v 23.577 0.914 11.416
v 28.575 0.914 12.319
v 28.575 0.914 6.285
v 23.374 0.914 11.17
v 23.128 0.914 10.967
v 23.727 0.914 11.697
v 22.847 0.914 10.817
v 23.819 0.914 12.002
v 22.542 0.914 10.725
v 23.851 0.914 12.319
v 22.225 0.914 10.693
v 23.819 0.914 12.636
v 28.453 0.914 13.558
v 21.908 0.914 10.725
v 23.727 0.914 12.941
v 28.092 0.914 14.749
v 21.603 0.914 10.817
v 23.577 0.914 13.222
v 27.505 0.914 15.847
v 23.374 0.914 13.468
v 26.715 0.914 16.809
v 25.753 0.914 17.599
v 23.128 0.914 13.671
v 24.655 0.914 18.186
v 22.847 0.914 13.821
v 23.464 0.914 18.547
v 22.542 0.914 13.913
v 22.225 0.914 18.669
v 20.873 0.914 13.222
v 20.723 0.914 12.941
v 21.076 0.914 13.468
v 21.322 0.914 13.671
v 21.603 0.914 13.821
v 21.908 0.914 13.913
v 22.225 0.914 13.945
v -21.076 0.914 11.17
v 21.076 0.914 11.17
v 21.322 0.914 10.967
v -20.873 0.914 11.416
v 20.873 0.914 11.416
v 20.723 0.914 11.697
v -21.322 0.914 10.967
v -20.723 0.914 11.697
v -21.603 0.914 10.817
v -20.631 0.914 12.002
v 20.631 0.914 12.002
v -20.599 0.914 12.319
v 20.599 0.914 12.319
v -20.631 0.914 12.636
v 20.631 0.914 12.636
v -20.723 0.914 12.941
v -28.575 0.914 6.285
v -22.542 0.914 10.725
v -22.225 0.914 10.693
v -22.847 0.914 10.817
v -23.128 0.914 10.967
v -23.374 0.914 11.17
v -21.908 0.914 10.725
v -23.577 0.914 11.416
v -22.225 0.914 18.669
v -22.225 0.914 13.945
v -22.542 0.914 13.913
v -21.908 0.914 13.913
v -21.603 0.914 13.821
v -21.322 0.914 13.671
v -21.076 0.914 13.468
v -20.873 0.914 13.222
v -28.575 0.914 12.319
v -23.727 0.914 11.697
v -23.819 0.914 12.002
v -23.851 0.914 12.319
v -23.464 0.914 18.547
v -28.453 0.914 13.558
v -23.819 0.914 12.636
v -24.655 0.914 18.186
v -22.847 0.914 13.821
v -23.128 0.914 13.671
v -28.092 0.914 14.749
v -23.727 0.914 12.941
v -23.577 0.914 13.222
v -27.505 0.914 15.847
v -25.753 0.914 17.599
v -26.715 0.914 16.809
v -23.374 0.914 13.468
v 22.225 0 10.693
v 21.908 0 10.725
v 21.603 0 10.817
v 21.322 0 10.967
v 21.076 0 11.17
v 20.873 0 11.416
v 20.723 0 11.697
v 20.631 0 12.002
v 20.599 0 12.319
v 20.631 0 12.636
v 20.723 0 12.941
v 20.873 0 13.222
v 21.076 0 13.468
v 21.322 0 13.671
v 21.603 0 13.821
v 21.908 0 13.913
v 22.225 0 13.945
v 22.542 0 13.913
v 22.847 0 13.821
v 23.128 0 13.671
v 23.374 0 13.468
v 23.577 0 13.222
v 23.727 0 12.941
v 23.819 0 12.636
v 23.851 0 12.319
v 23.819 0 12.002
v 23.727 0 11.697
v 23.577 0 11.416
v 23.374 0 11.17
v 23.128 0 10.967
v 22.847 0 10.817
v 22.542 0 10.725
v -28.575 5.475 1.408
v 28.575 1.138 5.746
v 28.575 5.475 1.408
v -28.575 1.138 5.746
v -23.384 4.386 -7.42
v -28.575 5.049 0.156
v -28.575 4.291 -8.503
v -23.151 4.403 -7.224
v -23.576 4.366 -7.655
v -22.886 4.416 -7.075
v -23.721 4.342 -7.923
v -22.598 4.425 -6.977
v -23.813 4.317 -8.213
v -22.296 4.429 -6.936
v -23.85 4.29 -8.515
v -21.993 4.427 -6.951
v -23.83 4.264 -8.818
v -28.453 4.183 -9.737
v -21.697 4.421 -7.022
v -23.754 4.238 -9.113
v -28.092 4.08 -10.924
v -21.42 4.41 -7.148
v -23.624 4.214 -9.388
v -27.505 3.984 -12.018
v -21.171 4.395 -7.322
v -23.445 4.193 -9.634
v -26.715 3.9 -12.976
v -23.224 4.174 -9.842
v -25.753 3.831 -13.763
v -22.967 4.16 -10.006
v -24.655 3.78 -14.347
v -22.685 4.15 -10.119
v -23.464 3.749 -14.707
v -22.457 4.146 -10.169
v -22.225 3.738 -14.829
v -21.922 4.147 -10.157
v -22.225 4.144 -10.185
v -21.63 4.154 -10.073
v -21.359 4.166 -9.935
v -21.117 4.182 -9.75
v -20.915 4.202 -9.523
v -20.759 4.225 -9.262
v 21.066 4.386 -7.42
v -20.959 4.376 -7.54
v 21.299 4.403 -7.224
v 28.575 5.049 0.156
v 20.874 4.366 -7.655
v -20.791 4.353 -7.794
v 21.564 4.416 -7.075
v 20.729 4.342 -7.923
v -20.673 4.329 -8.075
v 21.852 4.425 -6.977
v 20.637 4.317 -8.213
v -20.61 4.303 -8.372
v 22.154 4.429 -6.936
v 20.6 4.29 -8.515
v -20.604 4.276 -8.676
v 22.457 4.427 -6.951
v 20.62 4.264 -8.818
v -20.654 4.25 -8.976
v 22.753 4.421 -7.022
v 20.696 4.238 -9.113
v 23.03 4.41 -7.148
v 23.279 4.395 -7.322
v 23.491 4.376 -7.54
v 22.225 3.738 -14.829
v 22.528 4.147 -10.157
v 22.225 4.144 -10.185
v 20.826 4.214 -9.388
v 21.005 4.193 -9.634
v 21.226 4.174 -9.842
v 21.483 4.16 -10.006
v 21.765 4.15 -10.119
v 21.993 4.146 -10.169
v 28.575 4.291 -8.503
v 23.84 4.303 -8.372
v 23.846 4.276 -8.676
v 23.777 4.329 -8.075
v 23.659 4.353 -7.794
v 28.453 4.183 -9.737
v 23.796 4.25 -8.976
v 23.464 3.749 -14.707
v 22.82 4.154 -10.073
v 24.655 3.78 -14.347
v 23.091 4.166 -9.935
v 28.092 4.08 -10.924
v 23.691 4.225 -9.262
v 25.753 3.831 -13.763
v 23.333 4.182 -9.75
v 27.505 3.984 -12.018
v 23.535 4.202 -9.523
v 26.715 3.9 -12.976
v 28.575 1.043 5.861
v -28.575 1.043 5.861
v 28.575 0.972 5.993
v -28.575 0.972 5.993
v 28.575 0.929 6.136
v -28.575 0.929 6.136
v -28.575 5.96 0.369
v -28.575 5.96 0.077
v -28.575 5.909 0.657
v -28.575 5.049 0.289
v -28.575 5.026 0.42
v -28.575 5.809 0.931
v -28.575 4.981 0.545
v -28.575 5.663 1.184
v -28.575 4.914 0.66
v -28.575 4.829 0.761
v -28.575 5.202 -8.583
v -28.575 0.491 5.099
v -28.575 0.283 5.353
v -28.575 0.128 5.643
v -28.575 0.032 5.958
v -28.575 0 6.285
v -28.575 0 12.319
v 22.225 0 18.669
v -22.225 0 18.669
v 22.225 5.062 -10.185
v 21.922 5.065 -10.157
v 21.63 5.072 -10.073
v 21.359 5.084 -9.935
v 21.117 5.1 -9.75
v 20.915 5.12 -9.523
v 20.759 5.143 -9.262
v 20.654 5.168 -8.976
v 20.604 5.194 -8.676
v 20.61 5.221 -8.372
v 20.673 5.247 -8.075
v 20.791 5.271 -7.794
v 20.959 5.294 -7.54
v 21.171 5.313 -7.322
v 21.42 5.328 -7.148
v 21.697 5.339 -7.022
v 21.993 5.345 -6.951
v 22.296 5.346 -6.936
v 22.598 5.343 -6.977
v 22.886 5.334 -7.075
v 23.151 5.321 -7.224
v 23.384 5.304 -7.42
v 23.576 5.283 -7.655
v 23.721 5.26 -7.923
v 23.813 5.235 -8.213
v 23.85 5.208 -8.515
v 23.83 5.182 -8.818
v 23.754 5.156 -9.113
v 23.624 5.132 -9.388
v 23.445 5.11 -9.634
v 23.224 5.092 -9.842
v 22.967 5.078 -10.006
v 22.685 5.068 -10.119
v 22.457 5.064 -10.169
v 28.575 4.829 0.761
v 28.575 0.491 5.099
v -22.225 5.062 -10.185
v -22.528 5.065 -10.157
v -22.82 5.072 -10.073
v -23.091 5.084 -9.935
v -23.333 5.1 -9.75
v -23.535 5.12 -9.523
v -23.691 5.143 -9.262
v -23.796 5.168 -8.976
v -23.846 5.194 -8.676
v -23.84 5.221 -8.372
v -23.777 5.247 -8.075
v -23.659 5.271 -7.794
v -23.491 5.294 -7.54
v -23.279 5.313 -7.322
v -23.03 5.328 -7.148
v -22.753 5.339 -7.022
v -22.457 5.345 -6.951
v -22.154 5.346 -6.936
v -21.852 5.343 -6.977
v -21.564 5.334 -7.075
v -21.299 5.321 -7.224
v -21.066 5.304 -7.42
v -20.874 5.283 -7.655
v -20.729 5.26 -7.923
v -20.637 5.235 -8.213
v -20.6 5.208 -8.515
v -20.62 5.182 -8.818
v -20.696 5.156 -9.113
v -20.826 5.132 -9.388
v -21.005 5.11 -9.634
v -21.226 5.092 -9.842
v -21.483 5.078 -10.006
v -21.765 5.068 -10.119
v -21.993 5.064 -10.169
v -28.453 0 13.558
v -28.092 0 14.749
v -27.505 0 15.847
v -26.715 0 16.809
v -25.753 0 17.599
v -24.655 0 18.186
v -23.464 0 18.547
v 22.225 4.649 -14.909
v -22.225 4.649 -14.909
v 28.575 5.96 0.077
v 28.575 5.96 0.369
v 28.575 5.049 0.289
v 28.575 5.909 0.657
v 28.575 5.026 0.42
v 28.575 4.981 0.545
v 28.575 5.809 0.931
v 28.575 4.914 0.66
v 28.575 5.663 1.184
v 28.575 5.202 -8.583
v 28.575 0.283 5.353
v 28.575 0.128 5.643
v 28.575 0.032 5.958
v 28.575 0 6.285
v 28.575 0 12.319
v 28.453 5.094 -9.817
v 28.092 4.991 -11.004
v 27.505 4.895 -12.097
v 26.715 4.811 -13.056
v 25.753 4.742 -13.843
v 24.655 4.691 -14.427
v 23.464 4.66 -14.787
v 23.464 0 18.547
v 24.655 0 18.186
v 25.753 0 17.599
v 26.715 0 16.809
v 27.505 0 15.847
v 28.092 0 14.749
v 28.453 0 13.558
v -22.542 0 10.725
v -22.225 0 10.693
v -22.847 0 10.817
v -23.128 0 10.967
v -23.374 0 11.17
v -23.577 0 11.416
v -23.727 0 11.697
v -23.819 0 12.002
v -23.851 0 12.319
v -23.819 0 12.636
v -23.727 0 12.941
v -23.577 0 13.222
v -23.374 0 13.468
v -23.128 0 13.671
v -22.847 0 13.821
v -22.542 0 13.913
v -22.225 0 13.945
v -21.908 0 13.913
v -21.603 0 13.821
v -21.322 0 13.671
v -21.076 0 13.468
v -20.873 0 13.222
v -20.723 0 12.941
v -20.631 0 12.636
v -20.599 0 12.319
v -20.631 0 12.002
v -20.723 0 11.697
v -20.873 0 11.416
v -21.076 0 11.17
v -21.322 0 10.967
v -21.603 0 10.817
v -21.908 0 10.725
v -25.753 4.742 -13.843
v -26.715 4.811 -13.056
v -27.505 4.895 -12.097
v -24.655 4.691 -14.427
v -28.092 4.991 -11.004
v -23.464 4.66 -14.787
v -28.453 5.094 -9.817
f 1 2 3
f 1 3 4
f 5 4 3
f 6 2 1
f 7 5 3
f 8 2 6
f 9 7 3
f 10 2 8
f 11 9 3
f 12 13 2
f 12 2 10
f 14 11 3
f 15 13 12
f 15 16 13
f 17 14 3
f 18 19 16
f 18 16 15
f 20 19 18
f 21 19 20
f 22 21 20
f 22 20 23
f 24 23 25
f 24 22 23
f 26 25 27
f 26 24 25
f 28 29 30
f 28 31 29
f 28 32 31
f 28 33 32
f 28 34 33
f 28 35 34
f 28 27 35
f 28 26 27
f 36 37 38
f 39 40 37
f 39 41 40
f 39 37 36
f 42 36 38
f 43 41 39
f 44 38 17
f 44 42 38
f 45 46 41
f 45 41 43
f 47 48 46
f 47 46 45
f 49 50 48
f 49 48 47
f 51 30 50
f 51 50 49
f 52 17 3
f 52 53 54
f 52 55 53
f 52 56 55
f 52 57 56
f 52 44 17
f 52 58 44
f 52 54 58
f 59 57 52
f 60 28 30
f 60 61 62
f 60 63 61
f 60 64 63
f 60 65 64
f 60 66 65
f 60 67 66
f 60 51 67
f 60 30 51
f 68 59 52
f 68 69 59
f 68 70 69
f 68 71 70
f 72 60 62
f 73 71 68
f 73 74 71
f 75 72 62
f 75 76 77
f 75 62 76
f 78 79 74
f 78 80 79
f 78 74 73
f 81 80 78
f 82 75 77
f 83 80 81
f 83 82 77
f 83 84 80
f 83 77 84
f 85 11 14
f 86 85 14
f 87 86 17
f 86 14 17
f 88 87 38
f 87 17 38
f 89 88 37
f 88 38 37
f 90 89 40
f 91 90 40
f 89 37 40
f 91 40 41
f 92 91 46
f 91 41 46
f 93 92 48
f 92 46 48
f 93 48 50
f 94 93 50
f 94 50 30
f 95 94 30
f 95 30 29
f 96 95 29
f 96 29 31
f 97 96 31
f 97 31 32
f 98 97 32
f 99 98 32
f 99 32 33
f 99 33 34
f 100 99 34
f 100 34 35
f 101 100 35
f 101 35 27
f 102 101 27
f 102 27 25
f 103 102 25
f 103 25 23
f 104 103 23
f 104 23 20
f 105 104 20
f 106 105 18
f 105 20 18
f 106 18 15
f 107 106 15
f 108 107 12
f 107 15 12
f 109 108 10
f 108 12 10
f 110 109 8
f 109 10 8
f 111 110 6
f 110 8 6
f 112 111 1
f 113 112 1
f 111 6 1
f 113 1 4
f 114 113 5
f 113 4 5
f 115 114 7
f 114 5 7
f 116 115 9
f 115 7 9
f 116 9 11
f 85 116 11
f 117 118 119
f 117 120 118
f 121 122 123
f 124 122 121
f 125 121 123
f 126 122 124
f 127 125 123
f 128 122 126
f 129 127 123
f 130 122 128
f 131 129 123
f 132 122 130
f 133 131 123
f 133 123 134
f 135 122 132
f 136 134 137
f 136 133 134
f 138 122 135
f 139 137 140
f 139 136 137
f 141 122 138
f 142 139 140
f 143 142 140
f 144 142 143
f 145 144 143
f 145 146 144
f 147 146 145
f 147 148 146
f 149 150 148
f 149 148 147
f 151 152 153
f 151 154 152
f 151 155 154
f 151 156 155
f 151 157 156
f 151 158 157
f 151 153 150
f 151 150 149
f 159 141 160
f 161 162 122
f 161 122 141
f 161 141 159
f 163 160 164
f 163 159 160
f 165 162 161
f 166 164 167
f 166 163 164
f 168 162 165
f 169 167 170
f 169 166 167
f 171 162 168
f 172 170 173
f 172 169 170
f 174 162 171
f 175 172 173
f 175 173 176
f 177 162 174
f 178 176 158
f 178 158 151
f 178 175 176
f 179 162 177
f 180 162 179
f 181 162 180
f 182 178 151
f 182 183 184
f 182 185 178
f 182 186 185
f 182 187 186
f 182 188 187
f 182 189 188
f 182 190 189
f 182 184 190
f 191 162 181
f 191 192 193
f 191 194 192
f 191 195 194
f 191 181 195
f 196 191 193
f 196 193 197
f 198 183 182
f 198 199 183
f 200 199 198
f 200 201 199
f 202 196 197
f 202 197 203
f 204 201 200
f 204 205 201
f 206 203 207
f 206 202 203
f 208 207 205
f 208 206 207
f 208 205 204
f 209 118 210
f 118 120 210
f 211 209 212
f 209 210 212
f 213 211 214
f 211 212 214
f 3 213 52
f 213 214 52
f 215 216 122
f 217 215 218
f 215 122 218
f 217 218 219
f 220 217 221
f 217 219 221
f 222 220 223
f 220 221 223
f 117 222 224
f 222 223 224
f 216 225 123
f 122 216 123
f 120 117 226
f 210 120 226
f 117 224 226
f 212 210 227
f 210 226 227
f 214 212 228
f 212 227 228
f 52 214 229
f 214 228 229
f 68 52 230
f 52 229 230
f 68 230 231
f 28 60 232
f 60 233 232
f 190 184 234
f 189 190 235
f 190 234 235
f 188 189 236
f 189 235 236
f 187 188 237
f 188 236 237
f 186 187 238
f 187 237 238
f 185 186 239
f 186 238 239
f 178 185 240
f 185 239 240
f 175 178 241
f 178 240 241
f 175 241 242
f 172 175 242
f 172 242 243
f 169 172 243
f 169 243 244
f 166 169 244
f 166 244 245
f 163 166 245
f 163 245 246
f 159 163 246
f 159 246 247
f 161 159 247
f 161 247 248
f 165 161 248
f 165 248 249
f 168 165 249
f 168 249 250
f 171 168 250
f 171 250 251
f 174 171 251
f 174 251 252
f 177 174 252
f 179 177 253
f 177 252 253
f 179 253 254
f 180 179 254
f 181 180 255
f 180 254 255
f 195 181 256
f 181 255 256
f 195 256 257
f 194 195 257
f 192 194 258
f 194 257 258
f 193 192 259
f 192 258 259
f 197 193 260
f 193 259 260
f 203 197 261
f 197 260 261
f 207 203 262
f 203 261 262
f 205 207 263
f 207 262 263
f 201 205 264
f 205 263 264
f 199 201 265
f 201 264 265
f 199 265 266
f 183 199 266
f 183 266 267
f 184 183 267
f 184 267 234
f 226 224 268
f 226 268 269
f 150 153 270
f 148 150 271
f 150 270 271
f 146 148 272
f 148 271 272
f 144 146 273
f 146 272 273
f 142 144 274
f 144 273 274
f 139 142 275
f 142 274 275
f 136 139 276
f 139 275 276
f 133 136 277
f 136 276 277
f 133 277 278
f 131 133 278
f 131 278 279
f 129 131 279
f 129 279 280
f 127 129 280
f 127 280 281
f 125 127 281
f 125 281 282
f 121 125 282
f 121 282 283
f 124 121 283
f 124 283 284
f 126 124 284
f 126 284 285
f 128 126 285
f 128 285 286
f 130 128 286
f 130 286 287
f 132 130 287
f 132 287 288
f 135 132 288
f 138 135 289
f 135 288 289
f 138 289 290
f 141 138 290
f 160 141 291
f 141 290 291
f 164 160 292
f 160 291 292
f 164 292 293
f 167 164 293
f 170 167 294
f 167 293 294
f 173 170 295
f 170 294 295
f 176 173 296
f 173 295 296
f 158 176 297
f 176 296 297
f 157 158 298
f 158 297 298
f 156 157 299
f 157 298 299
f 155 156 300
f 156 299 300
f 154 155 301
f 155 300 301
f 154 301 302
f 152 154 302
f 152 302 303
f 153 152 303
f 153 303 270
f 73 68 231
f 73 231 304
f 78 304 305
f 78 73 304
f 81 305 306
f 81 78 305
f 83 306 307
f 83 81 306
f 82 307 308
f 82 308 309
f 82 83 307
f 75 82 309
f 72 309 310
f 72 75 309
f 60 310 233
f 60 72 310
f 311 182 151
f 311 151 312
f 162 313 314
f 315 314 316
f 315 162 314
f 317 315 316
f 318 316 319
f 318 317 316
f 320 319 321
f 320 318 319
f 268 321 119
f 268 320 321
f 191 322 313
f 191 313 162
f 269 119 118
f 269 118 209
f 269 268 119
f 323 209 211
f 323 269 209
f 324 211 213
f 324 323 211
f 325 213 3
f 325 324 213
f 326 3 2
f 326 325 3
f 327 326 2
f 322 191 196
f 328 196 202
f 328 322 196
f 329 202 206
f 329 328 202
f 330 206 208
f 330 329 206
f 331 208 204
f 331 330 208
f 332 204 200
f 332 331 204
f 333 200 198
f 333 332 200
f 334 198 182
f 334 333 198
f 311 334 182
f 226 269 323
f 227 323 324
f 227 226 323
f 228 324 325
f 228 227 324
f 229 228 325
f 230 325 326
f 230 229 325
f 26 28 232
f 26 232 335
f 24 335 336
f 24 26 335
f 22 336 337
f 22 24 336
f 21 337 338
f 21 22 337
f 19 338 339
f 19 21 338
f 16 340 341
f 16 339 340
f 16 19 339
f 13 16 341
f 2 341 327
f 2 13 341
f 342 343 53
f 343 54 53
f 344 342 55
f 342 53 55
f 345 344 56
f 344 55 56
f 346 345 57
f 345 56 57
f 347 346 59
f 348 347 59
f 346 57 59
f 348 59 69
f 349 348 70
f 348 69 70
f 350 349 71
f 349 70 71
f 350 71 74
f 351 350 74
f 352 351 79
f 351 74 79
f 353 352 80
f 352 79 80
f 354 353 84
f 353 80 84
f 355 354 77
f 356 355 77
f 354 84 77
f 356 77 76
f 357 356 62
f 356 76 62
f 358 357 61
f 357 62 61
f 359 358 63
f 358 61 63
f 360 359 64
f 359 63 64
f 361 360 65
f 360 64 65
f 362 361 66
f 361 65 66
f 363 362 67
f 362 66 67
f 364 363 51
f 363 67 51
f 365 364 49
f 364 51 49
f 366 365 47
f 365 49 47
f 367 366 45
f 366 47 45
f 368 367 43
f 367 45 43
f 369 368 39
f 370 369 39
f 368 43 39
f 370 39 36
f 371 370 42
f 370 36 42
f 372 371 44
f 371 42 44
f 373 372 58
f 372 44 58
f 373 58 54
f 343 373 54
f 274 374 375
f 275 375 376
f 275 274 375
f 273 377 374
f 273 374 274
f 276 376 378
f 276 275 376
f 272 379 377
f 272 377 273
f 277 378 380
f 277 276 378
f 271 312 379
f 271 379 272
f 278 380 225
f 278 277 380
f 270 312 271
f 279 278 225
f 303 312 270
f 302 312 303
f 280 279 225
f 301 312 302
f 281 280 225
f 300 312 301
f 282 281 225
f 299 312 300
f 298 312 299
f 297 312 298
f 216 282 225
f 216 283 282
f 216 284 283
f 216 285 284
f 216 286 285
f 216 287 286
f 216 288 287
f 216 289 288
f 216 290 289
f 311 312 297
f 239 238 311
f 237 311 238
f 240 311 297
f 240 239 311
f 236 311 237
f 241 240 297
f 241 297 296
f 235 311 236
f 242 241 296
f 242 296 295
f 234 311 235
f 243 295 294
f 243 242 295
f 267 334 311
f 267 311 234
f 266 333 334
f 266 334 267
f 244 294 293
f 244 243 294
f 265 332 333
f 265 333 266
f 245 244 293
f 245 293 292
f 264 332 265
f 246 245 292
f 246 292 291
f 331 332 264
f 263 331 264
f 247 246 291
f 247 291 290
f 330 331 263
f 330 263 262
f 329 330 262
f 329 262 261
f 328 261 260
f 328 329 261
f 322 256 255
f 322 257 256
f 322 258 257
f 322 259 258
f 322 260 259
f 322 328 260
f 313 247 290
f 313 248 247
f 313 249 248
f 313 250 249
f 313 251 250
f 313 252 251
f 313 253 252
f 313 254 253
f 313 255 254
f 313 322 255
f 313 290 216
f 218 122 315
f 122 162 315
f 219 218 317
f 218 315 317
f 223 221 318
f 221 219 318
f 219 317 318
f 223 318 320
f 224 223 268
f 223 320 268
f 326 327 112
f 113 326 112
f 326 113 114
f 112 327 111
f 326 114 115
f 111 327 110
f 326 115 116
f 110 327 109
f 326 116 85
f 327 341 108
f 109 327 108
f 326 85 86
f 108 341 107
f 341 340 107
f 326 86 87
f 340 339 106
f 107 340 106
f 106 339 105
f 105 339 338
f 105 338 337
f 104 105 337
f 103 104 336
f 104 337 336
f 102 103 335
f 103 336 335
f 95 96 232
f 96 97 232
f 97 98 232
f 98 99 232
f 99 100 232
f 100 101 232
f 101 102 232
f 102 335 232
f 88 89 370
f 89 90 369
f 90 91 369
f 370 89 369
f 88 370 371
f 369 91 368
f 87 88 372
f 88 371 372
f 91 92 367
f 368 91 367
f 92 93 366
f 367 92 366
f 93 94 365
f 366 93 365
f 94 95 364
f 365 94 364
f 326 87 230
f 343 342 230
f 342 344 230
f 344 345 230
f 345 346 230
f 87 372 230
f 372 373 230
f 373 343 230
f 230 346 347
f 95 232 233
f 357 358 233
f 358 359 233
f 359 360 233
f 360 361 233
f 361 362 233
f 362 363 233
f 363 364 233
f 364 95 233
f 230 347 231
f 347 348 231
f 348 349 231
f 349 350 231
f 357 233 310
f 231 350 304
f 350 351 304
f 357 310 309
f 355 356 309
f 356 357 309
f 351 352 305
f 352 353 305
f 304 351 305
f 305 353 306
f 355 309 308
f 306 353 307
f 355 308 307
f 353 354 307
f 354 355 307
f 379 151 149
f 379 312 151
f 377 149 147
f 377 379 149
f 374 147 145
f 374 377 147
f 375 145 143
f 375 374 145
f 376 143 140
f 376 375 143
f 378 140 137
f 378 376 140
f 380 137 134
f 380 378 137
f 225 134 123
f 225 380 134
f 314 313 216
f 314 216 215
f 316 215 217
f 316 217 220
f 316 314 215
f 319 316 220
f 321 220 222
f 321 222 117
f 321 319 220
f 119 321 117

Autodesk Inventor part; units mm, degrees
ref_plane "YZ Plane" through (0, 0, 0) normal (1, 0, 0) x (0, 1, 0)
ref_plane "XZ Plane" through (0, 0, 0) normal (0, 1, 0) x (-1, 0, 0)
ref_plane "XY Plane" through (0, 0, 0) normal (0, 0, 1) x (1, 0, 0)
sketch "Sketch4" plane through (0, 0, 0) normal (0, 1, 0) x (1, 0, 0)
  line L0 (22.225, -12.319) -> (-22.225, -12.319) construction
  line L1 (0, 12.7356) -> (0, -16.4948) construction
  point P0 (0, 0)
  point P1 (22.225, 8.5598)
  point P2 (-22.225, 8.5598)
  dimension "d23" = 44.45
  dimension "d25" = 20.8788
  dimension "d26" = 12.319
sketch "Sketch1" plane through (0, 0, 0) normal (0, 1, 0) x (-1, 0, 0)
  line L0 (28.575, 18.669) -> (-28.575, 18.669)
  line L1 (-28.575, 18.669) -> (-28.575, 5.969)
  line L2 (-28.575, 5.969) -> (28.575, 5.969)
  line L3 (28.575, 5.969) -> (28.575, 18.669)
  line L4 (28.575, 18.669) -> (-28.575, 5.969) construction
  line L5 (-28.575, 18.669) -> (28.575, 5.969) construction
  line L6 (0, 3.429) -> (0, 21.209)
  point P0 (0, 12.319)
  point P1 (-22.225, 12.319)
  point P2 (0, 12.319)
  point P3 (0, 12.319)
  dimension "d27" = 6.35
  dimension "d28" = 6.35
  dimension "d29" = 6.35
extrude "Plate1" add sketch "Sketch1" along normal blind 0.9144
sketch "Sketch2" plane through (-28.575, 0.9144, 5.969) normal (0, -0.7071068, -0.7071068) x (1, 0, 0)
  line L0 (57.15, 0) -> (0, 0)
  line L1 (0, 0) -> (0, -6.8054)
  line L2 (0, -6.8054) -> (57.15, -6.8054)
  line L3 (57.15, -6.8054) -> (57.15, 0)
edge flange "Flange1" height 5.08 angle 45 thickness 0.9144 bend radius 0.762 thickness toward (0, -0.7071068, -0.7071068) relief tear relief width 0.9144 relief depth 0.4572 edges at (0, 0.9144, 5.969) wall of the first edge with corners at (28.575, 0.9144, 5.969) (-28.575, 0.9144, 5.969) (-28.575, 5.7266, 1.1568) (28.575, 5.7266, 1.1568)
bend "Bend1"
corner "Corner1"
sketch "Sketch3" plane through (28.575, 5.08, 0.5102) normal (0, 0.9961947, -0.0871557) x (-1, 0, 0)
  line L0 (57.15, 0) -> (0, 0)
  line L1 (0, 0) -> (0, -15.3978)
  line L2 (0, -15.3978) -> (57.15, -15.3978)
  line L3 (57.15, -15.3978) -> (57.15, 0)
edge flange "Flange2" height 15.8242 angle 50 thickness 0.9144 bend radius 0.762 thickness toward (0, 0.9961947, -0.0871557) relief tear relief width 0.9144 relief depth 0.4572 edges at (0, 5.08, 0.5102) wall of the first edge with corners at (-28.575, 5.08, 0.5102) (28.575, 5.08, 0.5102) (28.575, 3.738, -14.829) (-28.575, 3.738, -14.829)
bend "Bend2"
corner "Corner2"
hole "Hole1" at (22.225, 0, 12.319) at (-22.225, 0, 12.319) at (22.225, 0, -8.5598) at (-22.225, 0, -8.5598) direction (0, 1, 0) diameter 3.2512 end through all
fillet "Corner Round1" radius 6.35 4 edges at (28.575, 4.1935, -14.8688) (-28.575, 4.1935, -14.8688) (-28.575, 0.4572, 18.669) (28.575, 0.4572, 18.669)
equation "\"d28\" = d27"
equation "\"d35\" = Thickness"
equation "\"d2\" = Thickness"
equation "\"d3\" = BendReliefWidth"
equation "\"d4\" = BendReliefDepth"
equation "\"d5\" = MinimumRemnant"
equation "\"d6\" = TransitionRadius"
equation "\"d9\" = BendRadius"
equation "\"d10\" = CornerReliefSize"
equation "\"d11\" = GapSize"
equation "\"d12\" = JacobiRadiusSize"
equation "\"d13\" = BendReliefWidth"
equation "\"d14\" = BendReliefDepth"
equation "\"d15\" = MinimumRemnant"
equation "\"d16\" = TransitionRadius"
equation "\"d19\" = BendRadius"
equation "\"d20\" = CornerReliefSize"
equation "\"d21\" = GapSize"
equation "\"d22\" = JacobiRadiusSize"
equation "\"BendReliefWidth\" = Thickness"
equation "\"BendReliefDepth\" = 0.5 * Thickness"
equation "\"CornerReliefSize\" = 4 * Thickness"
equation "\"MinimumRemnant\" = 2 * Thickness"
equation "\"TransitionRadius\" = BendRadius"
equation "\"JacobiRadiusSize\" = BendRadius"
equation "\"GapSize\" = Thickness"
equation "\"Thickness\" = 0.9144"
equation "\"BendRadius\" = 0.762"
properties part number "J009836" material "STAINLESS STEEL, 316"
